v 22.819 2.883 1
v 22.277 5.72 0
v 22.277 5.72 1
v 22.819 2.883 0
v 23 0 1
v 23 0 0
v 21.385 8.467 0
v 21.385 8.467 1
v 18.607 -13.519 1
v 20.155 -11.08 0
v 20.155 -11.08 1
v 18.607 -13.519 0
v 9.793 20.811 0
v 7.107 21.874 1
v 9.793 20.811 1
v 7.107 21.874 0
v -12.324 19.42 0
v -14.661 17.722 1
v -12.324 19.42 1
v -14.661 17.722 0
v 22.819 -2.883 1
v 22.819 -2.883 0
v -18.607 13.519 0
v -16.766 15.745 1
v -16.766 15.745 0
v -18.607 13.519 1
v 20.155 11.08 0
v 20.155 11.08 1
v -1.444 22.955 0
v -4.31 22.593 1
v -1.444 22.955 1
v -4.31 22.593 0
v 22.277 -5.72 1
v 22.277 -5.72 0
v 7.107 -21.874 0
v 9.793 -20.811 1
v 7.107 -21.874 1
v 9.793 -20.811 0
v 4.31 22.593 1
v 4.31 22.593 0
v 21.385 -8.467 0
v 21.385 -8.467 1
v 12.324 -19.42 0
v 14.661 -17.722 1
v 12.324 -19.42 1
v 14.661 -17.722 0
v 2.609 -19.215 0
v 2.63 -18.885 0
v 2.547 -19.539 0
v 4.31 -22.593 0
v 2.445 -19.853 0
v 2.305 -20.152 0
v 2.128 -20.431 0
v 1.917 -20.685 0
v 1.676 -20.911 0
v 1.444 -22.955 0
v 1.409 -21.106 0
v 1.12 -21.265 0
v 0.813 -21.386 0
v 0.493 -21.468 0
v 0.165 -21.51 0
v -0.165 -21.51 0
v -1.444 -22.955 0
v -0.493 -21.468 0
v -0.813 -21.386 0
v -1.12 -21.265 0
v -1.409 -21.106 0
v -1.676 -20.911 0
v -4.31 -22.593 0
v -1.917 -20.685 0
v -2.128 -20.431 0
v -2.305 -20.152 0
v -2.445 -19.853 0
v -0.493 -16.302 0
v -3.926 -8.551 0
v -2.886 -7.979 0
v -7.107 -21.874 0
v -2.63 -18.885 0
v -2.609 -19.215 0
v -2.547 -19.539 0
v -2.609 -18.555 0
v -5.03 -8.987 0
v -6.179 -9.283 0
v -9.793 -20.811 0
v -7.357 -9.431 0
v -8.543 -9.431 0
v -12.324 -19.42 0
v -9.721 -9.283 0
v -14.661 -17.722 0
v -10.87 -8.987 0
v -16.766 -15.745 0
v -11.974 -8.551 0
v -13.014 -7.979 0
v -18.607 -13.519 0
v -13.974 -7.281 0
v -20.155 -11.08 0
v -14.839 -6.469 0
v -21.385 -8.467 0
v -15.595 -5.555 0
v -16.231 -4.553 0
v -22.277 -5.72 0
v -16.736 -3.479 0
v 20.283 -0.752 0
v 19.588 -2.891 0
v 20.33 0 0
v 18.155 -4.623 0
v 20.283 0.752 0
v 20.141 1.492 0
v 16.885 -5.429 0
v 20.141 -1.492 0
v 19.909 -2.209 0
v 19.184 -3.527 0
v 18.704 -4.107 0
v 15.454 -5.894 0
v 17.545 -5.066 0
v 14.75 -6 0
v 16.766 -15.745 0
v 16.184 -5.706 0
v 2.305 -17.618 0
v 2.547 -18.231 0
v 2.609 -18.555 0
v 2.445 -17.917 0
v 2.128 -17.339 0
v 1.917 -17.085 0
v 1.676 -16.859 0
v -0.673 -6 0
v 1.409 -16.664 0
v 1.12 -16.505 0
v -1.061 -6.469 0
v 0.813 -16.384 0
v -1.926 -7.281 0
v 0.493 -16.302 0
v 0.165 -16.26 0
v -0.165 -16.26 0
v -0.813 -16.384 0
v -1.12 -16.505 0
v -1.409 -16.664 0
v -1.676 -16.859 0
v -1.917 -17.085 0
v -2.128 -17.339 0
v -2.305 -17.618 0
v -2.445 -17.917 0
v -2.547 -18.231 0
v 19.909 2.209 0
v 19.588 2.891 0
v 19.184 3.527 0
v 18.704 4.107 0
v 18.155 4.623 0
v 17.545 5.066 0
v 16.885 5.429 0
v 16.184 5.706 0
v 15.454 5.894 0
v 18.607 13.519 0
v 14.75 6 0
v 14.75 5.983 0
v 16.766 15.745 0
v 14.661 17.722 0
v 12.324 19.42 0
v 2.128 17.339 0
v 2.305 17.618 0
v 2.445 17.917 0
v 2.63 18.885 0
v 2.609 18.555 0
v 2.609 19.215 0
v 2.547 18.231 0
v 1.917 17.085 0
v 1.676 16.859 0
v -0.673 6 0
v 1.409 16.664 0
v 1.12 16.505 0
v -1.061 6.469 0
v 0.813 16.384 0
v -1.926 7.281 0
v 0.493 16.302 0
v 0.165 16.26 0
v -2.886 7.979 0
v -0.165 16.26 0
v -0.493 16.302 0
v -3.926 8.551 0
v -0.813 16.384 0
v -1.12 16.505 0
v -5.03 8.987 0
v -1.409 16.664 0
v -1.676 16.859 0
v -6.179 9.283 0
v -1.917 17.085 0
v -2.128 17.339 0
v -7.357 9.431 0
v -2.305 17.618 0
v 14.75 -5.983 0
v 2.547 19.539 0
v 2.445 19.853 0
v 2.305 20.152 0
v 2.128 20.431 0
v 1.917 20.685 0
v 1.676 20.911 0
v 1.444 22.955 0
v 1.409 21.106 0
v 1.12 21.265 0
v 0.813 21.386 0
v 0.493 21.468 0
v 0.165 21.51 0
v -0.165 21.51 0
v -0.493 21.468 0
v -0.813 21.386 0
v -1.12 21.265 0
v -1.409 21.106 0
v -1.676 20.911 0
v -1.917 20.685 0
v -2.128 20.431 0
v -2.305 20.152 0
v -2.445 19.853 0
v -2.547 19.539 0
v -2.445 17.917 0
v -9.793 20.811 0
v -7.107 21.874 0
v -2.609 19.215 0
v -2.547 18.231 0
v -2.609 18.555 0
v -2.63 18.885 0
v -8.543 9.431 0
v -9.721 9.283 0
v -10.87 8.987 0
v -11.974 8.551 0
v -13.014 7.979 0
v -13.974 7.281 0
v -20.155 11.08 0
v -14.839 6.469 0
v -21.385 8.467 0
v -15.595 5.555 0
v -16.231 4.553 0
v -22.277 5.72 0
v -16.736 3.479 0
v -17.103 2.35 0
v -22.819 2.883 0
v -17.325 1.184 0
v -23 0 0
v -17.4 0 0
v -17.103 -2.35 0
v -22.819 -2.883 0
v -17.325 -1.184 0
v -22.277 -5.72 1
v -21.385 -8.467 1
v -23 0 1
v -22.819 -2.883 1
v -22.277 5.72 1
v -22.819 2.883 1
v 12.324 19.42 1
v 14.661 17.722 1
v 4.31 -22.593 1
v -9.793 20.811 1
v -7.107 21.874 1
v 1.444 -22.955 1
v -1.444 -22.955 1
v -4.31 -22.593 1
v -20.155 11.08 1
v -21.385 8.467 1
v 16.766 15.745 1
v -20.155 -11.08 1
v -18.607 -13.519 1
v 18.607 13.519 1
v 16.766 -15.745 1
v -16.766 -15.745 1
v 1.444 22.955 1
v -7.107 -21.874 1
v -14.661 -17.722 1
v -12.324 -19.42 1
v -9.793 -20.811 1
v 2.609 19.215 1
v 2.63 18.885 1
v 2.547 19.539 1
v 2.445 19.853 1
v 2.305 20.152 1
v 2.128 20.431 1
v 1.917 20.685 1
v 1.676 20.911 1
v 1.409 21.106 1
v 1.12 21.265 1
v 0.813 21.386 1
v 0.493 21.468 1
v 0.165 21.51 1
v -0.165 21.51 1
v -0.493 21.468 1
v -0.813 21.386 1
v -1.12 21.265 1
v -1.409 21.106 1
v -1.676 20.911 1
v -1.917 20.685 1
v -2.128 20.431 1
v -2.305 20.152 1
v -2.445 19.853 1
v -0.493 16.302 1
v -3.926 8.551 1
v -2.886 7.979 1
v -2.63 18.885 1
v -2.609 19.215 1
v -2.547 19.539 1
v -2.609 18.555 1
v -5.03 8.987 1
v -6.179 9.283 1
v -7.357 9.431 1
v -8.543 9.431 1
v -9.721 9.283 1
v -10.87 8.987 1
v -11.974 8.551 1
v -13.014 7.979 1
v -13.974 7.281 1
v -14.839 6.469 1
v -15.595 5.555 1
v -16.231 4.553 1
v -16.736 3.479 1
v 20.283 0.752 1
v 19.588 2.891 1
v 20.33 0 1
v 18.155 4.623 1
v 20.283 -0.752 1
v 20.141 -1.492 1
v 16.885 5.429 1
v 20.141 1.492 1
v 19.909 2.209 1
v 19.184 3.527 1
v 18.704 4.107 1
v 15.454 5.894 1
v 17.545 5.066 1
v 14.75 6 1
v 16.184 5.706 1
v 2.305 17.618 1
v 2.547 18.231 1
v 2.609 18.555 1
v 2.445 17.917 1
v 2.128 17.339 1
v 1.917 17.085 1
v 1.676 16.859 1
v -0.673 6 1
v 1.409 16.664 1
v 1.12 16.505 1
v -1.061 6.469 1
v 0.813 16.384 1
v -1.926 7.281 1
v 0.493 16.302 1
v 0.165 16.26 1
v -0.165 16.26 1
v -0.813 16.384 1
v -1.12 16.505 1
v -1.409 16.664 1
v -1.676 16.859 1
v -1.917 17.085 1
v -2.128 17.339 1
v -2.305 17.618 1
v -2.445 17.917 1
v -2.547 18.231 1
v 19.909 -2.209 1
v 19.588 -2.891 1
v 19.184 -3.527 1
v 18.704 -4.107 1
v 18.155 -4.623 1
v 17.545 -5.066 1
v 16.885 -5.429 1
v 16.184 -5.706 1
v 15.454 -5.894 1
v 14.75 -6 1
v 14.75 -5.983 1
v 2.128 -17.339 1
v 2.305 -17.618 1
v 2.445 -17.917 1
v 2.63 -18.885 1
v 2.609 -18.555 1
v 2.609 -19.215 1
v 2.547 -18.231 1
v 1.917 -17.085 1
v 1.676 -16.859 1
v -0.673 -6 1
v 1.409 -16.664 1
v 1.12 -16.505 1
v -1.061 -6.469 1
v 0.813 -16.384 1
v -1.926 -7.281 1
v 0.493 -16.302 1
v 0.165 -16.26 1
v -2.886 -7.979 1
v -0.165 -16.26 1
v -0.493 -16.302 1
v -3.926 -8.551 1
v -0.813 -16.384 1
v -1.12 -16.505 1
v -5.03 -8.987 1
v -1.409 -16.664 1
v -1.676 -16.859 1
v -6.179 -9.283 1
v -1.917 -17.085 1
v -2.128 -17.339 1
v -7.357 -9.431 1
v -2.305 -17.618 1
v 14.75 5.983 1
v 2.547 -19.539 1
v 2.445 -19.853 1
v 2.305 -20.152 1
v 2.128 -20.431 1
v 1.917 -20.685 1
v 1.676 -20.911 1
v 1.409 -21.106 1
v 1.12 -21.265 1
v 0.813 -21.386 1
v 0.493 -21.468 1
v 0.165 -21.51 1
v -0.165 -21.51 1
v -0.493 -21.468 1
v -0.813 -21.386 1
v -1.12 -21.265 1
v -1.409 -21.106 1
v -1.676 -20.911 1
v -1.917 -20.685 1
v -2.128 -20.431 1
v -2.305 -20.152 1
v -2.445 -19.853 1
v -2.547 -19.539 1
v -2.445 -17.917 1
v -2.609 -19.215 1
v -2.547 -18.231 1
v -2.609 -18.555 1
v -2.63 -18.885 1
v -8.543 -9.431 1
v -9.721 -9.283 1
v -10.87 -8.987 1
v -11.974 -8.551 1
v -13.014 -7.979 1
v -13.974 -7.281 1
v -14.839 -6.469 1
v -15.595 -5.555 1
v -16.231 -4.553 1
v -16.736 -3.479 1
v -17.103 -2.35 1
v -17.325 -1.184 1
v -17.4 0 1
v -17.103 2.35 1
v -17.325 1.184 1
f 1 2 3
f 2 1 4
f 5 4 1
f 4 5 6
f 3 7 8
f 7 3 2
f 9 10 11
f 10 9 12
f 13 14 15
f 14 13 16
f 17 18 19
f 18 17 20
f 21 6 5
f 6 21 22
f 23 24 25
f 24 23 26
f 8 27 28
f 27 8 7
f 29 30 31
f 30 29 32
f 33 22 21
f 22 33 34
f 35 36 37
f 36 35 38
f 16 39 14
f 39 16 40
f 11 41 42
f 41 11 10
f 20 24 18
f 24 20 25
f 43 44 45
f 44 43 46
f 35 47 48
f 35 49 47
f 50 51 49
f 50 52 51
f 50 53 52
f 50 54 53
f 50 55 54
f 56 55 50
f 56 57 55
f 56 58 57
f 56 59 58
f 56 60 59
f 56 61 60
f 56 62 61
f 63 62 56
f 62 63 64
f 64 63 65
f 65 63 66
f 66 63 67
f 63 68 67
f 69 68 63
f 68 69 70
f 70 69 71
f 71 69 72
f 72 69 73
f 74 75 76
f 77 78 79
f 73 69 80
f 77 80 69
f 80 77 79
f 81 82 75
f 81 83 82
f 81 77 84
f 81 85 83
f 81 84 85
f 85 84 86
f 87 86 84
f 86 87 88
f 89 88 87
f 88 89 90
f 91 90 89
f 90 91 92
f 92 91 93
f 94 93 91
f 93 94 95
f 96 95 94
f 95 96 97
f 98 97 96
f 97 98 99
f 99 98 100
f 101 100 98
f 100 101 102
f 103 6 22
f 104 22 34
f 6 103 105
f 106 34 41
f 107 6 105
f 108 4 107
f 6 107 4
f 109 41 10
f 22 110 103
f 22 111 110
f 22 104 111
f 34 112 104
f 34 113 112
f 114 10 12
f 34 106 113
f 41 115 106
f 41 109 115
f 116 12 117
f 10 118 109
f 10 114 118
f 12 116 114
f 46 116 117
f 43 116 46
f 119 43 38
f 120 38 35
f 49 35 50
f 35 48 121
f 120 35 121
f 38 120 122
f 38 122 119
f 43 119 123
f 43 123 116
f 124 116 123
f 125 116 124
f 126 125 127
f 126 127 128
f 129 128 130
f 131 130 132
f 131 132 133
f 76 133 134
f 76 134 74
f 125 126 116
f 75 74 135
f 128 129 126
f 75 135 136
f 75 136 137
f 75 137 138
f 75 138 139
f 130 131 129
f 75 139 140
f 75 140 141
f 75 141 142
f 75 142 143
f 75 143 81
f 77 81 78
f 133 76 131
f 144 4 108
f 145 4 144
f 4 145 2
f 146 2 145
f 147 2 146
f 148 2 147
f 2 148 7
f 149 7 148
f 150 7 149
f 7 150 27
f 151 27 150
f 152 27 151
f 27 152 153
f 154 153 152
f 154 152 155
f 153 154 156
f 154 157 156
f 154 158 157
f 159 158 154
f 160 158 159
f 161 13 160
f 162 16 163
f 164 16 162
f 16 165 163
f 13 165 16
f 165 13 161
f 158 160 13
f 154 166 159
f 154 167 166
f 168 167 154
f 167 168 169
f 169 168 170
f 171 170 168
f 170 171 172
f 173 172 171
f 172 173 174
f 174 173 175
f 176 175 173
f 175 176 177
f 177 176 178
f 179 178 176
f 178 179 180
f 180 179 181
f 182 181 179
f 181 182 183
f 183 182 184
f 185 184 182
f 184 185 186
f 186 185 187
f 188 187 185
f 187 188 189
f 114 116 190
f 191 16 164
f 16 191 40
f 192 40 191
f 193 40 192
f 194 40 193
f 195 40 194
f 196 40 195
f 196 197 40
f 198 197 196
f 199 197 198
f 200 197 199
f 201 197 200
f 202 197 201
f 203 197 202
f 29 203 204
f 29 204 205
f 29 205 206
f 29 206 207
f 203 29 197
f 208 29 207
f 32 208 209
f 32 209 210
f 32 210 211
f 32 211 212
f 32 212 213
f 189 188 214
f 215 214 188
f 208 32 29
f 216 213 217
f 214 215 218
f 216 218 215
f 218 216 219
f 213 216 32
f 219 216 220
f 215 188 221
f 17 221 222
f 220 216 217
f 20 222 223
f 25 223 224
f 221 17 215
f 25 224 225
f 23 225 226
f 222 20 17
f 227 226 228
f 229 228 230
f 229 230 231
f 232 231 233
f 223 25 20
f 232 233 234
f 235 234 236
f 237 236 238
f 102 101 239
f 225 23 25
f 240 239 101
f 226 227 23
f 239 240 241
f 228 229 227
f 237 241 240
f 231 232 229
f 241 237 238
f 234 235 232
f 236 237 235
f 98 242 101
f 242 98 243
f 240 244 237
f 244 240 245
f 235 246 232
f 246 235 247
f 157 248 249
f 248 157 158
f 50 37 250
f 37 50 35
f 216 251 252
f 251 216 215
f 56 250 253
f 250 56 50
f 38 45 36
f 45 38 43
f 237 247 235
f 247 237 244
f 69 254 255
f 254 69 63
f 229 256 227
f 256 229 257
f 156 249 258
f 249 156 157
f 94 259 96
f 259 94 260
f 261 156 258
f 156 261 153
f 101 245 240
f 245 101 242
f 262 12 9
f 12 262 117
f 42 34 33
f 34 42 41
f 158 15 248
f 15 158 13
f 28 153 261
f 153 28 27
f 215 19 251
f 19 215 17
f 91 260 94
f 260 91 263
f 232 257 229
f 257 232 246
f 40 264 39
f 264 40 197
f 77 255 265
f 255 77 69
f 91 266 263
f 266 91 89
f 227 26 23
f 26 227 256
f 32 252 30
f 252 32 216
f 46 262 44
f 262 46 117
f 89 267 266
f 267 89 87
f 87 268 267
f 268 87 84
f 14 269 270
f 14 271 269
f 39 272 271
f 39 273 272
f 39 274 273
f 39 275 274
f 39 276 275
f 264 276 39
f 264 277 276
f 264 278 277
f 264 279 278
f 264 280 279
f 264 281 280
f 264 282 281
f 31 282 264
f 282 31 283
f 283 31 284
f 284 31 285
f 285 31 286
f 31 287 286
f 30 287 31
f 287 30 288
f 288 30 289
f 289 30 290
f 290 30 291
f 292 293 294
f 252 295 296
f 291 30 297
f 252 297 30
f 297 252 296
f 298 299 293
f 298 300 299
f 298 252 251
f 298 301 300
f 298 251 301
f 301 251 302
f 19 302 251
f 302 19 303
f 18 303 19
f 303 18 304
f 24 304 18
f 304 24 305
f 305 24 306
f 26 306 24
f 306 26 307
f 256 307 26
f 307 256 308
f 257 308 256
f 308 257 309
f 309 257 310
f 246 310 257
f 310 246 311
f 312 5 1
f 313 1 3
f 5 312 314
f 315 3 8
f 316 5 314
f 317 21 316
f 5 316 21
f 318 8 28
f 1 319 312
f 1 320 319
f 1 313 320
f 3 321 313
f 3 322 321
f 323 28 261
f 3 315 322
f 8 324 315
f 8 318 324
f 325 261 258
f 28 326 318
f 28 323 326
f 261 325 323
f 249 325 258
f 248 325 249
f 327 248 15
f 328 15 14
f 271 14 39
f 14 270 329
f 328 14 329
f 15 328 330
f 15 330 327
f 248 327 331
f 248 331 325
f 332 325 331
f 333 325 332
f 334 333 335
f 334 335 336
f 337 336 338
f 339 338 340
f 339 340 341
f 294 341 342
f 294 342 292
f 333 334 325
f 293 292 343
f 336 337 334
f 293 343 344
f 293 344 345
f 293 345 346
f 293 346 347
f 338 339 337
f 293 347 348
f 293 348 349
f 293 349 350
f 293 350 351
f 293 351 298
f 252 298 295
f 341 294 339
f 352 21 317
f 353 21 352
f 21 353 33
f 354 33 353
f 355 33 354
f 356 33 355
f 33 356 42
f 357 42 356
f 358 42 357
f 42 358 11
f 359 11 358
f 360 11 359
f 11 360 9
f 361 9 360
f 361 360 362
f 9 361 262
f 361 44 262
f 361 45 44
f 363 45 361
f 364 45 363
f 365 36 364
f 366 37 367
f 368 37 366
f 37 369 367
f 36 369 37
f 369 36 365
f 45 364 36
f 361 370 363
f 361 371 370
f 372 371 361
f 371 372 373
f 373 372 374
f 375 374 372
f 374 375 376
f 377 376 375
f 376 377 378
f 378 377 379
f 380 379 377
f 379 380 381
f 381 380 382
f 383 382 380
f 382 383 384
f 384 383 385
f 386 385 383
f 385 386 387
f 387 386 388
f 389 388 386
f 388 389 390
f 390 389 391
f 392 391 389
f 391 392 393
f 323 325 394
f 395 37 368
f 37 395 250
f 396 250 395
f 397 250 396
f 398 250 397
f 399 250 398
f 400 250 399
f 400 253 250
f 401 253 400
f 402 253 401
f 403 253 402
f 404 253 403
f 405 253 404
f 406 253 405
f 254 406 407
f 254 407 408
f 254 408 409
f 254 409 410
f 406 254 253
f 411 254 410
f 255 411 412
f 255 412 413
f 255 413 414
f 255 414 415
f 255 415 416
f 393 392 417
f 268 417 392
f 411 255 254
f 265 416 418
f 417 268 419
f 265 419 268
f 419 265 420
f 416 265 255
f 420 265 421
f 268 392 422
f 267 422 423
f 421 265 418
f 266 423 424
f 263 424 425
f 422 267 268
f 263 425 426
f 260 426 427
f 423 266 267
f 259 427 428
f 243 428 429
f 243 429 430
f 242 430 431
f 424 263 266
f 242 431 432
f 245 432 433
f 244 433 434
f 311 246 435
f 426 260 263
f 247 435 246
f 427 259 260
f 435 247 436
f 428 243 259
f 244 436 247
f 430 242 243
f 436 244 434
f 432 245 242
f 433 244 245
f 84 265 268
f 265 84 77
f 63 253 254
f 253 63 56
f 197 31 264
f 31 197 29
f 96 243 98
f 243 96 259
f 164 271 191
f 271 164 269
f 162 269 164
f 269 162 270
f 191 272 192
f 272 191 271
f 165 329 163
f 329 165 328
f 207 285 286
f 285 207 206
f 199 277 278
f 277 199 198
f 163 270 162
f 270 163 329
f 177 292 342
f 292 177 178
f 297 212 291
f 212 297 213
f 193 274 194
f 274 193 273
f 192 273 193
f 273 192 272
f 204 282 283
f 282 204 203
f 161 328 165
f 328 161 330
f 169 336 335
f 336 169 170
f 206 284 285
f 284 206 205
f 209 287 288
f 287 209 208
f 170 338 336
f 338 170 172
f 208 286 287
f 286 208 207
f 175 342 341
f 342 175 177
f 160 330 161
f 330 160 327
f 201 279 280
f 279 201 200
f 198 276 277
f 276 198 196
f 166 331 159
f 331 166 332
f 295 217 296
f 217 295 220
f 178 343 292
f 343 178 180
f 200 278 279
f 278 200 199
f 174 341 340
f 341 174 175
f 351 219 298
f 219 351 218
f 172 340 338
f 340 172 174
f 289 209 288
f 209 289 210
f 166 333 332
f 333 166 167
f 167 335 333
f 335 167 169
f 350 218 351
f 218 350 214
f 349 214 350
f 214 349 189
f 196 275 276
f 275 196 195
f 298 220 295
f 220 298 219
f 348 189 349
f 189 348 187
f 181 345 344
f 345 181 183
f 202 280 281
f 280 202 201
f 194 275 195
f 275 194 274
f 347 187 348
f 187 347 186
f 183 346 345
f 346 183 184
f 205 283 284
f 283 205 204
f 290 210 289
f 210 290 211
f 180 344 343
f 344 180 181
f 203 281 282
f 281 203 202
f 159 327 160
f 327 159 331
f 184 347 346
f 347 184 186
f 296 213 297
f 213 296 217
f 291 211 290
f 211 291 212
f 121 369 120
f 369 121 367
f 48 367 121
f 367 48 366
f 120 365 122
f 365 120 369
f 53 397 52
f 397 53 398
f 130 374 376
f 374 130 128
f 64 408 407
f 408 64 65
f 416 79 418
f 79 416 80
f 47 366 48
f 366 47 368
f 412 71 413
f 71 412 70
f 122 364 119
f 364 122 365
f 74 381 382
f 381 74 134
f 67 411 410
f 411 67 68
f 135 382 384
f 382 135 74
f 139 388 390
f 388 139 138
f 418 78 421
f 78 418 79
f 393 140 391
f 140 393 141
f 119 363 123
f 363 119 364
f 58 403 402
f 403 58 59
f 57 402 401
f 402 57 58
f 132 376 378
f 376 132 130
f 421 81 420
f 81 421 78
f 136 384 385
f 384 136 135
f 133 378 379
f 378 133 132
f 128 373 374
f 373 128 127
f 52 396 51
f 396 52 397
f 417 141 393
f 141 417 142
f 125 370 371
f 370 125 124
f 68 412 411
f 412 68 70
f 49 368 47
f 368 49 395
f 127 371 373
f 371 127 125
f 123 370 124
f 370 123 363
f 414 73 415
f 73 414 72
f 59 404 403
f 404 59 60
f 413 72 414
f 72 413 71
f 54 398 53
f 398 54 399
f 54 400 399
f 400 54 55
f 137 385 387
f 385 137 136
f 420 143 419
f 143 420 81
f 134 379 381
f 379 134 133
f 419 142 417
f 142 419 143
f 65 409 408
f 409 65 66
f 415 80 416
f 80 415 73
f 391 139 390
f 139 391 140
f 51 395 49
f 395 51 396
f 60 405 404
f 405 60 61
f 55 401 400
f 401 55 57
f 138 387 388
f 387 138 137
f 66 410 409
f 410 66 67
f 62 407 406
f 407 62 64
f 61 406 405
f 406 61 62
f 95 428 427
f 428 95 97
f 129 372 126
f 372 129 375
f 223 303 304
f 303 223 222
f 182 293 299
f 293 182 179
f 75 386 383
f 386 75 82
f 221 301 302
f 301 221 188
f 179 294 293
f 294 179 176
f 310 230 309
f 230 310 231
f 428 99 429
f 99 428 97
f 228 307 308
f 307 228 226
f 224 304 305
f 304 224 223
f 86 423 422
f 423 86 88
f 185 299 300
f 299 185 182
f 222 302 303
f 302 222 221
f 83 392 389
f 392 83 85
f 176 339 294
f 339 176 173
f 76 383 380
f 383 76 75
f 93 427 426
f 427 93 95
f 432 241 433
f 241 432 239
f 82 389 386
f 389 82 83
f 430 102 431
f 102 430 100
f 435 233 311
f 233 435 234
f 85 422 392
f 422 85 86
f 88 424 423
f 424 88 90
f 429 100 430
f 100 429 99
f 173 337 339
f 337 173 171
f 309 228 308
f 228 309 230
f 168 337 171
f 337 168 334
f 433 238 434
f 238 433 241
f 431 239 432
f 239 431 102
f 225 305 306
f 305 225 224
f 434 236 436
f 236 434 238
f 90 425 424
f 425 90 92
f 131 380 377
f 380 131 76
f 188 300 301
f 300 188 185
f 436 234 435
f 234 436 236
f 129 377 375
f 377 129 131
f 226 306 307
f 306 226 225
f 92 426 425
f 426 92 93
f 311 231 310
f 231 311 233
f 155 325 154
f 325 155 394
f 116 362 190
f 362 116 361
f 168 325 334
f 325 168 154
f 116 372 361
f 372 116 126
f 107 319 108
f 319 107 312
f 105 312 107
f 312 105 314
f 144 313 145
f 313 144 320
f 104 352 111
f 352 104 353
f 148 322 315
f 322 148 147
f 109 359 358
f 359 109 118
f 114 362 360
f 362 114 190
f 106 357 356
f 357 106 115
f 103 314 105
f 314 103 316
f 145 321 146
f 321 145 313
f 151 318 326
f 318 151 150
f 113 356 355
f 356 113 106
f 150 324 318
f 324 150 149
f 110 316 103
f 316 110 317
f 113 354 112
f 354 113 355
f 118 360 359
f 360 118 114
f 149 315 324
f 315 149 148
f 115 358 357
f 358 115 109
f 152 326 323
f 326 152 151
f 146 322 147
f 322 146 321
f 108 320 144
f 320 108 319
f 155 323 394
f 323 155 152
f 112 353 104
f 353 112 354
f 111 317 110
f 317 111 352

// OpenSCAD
resolution =50;
module deel1(){
difference()
{
    cylinder(h=1,r=23,$fn=resolution);
    translate([0,(21.5-(5.23/2)),0])cylinder(h=1,r=5.26/2,$fn=resolution);
    translate([0,-(21.5-(5.23/2)),0])cylinder(h=1,r=5.26/2,$fn=resolution);
    translate([-(23-18.9/2-5.6),0,0])cylinder(h=1,r=18.9/2,$fn=resolution);
    cube([29.5,12,4],center=true)
    translate([(23-3-5.67),0,0])cylinder(h=1,r=6,$fn=resolution);
}}

difference()
{
    deel1();
    translate([(23-3-5.67),0,0])cylinder(h=1,r=6,$fn=resolution); 
}
